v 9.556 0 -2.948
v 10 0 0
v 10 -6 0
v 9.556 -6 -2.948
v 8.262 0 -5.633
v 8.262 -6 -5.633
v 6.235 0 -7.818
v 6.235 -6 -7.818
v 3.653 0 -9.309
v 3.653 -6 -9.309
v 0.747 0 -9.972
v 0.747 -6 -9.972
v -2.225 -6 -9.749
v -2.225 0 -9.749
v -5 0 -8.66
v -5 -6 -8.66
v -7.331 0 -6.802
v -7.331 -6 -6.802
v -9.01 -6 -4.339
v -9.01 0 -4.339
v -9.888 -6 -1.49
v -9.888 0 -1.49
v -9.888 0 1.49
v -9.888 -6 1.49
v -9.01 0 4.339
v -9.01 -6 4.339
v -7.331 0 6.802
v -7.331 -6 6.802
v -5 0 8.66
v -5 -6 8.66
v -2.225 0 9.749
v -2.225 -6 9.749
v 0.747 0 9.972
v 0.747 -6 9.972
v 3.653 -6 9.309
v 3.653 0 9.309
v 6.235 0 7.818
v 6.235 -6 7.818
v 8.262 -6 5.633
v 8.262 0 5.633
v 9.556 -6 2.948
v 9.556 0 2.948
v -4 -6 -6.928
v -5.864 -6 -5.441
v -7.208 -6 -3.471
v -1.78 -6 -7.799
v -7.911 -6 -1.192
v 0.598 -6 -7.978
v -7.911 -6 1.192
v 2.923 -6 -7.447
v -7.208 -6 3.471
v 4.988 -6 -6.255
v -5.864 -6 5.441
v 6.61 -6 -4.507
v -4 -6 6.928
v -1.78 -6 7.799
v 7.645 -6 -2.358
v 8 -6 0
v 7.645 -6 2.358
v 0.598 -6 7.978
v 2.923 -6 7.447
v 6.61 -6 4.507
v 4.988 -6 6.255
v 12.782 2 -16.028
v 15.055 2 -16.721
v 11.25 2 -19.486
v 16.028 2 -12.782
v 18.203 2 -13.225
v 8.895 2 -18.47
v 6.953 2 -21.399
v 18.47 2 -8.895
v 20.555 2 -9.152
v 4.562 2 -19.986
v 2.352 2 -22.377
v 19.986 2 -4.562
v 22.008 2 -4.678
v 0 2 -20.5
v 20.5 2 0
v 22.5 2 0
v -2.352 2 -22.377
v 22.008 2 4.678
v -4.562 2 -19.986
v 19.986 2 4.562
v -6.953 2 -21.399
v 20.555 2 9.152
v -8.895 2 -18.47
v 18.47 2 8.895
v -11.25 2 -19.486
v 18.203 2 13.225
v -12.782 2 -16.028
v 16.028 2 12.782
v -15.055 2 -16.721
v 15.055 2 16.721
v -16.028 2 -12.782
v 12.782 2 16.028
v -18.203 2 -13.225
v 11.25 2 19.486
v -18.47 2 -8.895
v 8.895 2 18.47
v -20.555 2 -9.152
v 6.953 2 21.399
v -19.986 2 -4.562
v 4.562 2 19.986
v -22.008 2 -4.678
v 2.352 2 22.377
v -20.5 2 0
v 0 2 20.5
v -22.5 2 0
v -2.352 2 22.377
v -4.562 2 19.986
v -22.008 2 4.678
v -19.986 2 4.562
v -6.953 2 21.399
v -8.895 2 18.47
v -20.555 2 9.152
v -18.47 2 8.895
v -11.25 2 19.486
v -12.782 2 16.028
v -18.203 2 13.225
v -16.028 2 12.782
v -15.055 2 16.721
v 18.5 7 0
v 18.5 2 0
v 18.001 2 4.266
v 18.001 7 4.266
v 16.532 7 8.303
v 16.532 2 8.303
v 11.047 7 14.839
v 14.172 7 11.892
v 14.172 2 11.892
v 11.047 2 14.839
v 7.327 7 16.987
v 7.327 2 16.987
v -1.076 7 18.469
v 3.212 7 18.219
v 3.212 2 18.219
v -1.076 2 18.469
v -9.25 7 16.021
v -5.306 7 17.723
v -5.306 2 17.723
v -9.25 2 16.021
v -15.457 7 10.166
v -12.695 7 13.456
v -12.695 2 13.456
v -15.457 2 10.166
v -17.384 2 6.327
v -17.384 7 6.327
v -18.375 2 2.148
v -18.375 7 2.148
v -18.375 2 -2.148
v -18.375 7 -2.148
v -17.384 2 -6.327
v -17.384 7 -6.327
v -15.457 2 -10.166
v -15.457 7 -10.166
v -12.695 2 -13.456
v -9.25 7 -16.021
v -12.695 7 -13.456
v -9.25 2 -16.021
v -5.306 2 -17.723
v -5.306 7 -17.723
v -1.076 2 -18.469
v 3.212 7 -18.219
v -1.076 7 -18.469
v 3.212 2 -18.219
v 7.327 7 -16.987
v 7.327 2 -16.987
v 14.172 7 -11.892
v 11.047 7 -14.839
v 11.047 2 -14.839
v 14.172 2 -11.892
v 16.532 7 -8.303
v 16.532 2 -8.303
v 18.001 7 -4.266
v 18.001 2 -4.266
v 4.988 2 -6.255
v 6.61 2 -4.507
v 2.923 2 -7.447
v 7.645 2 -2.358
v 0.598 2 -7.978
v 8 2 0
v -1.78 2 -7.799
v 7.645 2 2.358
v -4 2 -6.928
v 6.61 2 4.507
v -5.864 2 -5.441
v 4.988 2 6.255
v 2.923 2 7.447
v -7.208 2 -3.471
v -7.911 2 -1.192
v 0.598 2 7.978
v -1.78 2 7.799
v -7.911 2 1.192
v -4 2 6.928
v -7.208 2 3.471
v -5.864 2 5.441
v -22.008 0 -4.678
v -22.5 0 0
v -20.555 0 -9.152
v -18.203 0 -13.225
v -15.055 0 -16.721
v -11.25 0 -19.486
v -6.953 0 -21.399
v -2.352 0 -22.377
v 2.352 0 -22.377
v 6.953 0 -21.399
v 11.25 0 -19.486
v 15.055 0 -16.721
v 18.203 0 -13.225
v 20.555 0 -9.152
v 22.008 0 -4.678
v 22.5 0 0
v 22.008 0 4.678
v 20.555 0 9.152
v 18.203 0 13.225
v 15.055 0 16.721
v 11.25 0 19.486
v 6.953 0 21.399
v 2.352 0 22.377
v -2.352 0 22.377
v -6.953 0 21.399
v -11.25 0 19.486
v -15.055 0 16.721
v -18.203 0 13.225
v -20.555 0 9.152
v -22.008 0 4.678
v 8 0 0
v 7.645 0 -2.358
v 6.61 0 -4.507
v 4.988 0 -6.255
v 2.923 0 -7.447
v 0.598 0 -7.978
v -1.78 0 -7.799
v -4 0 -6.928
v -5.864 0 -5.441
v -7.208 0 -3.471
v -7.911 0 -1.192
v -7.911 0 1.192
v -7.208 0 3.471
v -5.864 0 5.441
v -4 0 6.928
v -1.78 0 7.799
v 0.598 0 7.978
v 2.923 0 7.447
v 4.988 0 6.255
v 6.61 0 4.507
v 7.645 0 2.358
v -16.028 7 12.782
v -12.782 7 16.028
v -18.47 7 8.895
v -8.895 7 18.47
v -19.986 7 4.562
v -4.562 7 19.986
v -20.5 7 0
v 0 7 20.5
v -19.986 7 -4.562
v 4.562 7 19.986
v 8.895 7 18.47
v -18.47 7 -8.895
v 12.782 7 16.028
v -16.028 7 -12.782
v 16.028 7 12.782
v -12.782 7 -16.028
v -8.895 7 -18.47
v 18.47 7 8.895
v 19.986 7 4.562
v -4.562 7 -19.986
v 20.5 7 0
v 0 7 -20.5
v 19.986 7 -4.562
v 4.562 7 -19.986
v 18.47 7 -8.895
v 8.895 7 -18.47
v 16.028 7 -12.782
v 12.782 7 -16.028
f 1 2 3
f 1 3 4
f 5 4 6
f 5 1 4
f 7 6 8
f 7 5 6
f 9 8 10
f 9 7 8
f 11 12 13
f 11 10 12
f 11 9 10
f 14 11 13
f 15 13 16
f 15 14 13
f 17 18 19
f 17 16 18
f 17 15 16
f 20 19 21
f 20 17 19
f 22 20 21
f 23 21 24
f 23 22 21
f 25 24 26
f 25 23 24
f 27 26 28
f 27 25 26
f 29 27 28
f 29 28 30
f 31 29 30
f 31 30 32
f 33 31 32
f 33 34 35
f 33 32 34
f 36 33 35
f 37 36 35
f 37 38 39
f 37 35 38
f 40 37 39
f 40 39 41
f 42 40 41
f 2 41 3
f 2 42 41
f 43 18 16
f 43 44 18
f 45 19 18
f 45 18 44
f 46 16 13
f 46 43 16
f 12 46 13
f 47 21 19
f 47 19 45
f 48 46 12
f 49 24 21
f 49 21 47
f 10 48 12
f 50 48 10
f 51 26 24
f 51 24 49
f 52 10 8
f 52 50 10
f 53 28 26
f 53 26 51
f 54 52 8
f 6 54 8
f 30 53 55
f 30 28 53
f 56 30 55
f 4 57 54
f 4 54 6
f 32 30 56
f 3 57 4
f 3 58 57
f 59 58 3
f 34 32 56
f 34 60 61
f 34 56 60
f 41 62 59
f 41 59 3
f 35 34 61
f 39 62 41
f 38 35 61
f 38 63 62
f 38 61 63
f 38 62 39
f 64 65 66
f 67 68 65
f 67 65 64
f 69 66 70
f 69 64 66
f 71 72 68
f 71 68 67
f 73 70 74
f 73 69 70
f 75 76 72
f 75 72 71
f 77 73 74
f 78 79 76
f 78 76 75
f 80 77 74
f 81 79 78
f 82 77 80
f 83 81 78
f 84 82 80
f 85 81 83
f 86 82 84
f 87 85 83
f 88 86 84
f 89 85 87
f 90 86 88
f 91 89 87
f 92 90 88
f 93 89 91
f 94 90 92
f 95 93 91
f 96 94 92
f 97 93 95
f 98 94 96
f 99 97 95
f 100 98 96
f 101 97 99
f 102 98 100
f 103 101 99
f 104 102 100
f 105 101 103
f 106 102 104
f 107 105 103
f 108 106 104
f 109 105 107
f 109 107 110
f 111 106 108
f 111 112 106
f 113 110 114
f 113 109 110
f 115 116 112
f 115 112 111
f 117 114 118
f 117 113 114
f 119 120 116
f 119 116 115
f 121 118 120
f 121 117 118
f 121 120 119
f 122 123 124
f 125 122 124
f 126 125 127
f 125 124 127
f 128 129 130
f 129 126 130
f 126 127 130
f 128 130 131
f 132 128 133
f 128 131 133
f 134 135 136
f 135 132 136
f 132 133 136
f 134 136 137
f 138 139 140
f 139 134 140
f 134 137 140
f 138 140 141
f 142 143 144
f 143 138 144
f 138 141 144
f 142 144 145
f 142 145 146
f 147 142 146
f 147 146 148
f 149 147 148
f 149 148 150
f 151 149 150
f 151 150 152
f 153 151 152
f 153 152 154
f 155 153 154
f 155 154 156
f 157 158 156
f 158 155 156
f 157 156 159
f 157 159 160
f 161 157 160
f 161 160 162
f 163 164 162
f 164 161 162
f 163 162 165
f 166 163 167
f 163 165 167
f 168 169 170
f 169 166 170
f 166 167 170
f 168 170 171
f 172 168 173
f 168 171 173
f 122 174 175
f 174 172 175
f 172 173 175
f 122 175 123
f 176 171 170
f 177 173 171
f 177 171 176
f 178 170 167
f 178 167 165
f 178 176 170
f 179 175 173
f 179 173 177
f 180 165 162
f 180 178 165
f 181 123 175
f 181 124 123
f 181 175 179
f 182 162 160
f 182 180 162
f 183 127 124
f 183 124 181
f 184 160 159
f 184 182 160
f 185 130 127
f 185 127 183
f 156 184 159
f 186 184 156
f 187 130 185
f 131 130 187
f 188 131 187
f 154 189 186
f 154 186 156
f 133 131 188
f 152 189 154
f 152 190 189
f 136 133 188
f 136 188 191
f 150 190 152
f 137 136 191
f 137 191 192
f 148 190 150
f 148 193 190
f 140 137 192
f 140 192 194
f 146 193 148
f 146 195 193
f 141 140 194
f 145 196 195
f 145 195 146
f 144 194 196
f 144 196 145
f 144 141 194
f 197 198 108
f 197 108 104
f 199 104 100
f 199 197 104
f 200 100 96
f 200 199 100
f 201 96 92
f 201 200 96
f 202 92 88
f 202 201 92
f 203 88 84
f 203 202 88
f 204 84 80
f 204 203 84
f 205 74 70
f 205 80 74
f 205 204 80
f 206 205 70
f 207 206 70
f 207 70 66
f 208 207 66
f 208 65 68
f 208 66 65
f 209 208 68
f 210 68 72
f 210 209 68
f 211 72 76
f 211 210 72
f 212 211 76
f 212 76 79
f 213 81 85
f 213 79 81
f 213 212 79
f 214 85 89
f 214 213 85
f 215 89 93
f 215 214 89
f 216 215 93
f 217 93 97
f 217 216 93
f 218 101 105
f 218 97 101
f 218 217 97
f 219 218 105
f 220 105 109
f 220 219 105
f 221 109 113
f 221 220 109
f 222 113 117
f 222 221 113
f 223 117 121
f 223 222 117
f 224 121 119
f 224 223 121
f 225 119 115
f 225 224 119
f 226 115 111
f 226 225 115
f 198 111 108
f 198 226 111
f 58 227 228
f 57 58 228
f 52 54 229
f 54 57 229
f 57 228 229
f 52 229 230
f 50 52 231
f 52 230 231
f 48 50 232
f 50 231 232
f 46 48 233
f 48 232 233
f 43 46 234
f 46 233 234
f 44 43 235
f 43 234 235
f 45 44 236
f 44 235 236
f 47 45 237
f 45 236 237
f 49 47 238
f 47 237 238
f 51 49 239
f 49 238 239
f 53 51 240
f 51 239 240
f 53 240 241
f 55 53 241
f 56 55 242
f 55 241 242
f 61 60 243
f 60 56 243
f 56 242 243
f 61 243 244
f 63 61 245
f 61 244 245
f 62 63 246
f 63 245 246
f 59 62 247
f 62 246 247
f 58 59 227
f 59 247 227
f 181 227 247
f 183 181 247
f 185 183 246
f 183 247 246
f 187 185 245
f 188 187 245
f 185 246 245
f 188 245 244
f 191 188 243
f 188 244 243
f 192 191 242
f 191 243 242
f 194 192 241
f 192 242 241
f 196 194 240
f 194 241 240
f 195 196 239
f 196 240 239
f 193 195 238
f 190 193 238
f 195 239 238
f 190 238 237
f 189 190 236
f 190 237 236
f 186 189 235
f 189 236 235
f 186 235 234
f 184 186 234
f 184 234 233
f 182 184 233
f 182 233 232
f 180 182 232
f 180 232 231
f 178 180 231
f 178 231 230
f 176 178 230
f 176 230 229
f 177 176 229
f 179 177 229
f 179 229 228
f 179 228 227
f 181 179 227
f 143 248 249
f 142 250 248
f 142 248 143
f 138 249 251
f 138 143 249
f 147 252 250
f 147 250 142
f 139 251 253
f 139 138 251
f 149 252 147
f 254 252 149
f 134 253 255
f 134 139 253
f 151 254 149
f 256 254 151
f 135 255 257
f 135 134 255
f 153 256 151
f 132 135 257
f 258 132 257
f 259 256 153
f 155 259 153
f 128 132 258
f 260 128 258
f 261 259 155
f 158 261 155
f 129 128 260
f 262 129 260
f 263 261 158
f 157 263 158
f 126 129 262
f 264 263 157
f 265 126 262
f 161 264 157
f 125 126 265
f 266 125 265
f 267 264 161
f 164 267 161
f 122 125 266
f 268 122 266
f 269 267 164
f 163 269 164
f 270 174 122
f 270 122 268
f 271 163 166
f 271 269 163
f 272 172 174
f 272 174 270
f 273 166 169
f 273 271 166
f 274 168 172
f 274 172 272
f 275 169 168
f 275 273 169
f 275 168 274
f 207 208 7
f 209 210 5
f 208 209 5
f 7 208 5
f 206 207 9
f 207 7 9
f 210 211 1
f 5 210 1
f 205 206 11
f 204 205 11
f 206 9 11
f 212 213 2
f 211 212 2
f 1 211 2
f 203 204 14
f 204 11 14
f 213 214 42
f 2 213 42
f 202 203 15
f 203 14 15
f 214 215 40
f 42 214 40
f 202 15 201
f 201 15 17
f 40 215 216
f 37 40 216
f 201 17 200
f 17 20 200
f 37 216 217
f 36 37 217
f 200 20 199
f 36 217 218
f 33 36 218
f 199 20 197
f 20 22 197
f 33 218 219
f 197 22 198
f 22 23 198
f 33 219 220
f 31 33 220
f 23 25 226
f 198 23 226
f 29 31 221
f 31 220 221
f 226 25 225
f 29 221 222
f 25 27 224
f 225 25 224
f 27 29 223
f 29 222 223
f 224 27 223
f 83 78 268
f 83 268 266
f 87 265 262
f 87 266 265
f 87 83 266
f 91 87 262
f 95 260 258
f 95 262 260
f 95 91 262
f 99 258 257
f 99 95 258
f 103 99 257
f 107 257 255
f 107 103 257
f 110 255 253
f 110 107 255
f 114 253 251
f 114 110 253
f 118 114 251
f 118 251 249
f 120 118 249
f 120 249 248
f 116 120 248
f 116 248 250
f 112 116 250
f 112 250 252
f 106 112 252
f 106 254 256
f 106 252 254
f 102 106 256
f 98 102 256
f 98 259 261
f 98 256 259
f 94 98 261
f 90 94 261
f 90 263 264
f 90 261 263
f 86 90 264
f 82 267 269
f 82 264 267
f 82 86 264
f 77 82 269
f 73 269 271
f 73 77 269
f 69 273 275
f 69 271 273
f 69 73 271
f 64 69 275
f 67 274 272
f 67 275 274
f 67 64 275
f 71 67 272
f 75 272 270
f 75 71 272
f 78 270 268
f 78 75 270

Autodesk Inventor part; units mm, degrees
ref_plane "YZ Plane" through (0, 0, 0) normal (1, 0, 0) x (0, 1, 0)
ref_plane "XZ Plane" through (0, 0, 0) normal (0, 1, 0) x (-1, 0, 0)
ref_plane "XY Plane" through (0, 0, 0) normal (0, 0, 1) x (1, 0, 0)
sketch "Sketch1" plane through (0, 0, 0) normal (0, 1, 0) x (-1, 0, 0)
  circle A0 centre (0, 0) radius 22.5
  dimension "d0" = 45
extrude "Extrusion1" add sketch "Sketch1" along normal blind 2
sketch "Sketch2" plane through (0, 2, 0) normal (0, 1, 0) x (1, 0, 0)
  circle A0 centre (0, 0) radius 22.5 projected
  circle A1 centre (0, 0) radius 20.5
  circle A2 centre (0, 0) radius 18.5
  dimension "d3" = 2
  dimension "d4" = 4
extrude "Extrusion2" add sketch "Sketch2" along normal blind 5 contours A1
sketch "Sketch3" plane through (0, 0, 0) normal (0, -1, 0) x (1, 0, 0)
  circle A0 centre (0, 0) radius 20.5 projected
  circle A1 centre (0, 0) radius 22.5 projected
  circle A2 centre (0, 0) radius 8
  dimension "d7" = 16
extrude "Extrusion3" cut sketch "Sketch3" against normal blind 3 contours A2
sketch "Sketch4" plane through (0, 0, 0) normal (0, -1, 0) x (1, 0, 0)
  circle A0 centre (0, 0) radius 8 projected
  circle A1 centre (0, 0) radius 22.5 projected
  circle A2 centre (0, 0) radius 8 projected
  circle A3 centre (0, 0) radius 10
  dimension "d10" = 2
extrude "Extrusion4" add sketch "Sketch4" along normal blind 6 contours A3
properties part number "Pieza 1.2 final" material "ABS Plastic"
